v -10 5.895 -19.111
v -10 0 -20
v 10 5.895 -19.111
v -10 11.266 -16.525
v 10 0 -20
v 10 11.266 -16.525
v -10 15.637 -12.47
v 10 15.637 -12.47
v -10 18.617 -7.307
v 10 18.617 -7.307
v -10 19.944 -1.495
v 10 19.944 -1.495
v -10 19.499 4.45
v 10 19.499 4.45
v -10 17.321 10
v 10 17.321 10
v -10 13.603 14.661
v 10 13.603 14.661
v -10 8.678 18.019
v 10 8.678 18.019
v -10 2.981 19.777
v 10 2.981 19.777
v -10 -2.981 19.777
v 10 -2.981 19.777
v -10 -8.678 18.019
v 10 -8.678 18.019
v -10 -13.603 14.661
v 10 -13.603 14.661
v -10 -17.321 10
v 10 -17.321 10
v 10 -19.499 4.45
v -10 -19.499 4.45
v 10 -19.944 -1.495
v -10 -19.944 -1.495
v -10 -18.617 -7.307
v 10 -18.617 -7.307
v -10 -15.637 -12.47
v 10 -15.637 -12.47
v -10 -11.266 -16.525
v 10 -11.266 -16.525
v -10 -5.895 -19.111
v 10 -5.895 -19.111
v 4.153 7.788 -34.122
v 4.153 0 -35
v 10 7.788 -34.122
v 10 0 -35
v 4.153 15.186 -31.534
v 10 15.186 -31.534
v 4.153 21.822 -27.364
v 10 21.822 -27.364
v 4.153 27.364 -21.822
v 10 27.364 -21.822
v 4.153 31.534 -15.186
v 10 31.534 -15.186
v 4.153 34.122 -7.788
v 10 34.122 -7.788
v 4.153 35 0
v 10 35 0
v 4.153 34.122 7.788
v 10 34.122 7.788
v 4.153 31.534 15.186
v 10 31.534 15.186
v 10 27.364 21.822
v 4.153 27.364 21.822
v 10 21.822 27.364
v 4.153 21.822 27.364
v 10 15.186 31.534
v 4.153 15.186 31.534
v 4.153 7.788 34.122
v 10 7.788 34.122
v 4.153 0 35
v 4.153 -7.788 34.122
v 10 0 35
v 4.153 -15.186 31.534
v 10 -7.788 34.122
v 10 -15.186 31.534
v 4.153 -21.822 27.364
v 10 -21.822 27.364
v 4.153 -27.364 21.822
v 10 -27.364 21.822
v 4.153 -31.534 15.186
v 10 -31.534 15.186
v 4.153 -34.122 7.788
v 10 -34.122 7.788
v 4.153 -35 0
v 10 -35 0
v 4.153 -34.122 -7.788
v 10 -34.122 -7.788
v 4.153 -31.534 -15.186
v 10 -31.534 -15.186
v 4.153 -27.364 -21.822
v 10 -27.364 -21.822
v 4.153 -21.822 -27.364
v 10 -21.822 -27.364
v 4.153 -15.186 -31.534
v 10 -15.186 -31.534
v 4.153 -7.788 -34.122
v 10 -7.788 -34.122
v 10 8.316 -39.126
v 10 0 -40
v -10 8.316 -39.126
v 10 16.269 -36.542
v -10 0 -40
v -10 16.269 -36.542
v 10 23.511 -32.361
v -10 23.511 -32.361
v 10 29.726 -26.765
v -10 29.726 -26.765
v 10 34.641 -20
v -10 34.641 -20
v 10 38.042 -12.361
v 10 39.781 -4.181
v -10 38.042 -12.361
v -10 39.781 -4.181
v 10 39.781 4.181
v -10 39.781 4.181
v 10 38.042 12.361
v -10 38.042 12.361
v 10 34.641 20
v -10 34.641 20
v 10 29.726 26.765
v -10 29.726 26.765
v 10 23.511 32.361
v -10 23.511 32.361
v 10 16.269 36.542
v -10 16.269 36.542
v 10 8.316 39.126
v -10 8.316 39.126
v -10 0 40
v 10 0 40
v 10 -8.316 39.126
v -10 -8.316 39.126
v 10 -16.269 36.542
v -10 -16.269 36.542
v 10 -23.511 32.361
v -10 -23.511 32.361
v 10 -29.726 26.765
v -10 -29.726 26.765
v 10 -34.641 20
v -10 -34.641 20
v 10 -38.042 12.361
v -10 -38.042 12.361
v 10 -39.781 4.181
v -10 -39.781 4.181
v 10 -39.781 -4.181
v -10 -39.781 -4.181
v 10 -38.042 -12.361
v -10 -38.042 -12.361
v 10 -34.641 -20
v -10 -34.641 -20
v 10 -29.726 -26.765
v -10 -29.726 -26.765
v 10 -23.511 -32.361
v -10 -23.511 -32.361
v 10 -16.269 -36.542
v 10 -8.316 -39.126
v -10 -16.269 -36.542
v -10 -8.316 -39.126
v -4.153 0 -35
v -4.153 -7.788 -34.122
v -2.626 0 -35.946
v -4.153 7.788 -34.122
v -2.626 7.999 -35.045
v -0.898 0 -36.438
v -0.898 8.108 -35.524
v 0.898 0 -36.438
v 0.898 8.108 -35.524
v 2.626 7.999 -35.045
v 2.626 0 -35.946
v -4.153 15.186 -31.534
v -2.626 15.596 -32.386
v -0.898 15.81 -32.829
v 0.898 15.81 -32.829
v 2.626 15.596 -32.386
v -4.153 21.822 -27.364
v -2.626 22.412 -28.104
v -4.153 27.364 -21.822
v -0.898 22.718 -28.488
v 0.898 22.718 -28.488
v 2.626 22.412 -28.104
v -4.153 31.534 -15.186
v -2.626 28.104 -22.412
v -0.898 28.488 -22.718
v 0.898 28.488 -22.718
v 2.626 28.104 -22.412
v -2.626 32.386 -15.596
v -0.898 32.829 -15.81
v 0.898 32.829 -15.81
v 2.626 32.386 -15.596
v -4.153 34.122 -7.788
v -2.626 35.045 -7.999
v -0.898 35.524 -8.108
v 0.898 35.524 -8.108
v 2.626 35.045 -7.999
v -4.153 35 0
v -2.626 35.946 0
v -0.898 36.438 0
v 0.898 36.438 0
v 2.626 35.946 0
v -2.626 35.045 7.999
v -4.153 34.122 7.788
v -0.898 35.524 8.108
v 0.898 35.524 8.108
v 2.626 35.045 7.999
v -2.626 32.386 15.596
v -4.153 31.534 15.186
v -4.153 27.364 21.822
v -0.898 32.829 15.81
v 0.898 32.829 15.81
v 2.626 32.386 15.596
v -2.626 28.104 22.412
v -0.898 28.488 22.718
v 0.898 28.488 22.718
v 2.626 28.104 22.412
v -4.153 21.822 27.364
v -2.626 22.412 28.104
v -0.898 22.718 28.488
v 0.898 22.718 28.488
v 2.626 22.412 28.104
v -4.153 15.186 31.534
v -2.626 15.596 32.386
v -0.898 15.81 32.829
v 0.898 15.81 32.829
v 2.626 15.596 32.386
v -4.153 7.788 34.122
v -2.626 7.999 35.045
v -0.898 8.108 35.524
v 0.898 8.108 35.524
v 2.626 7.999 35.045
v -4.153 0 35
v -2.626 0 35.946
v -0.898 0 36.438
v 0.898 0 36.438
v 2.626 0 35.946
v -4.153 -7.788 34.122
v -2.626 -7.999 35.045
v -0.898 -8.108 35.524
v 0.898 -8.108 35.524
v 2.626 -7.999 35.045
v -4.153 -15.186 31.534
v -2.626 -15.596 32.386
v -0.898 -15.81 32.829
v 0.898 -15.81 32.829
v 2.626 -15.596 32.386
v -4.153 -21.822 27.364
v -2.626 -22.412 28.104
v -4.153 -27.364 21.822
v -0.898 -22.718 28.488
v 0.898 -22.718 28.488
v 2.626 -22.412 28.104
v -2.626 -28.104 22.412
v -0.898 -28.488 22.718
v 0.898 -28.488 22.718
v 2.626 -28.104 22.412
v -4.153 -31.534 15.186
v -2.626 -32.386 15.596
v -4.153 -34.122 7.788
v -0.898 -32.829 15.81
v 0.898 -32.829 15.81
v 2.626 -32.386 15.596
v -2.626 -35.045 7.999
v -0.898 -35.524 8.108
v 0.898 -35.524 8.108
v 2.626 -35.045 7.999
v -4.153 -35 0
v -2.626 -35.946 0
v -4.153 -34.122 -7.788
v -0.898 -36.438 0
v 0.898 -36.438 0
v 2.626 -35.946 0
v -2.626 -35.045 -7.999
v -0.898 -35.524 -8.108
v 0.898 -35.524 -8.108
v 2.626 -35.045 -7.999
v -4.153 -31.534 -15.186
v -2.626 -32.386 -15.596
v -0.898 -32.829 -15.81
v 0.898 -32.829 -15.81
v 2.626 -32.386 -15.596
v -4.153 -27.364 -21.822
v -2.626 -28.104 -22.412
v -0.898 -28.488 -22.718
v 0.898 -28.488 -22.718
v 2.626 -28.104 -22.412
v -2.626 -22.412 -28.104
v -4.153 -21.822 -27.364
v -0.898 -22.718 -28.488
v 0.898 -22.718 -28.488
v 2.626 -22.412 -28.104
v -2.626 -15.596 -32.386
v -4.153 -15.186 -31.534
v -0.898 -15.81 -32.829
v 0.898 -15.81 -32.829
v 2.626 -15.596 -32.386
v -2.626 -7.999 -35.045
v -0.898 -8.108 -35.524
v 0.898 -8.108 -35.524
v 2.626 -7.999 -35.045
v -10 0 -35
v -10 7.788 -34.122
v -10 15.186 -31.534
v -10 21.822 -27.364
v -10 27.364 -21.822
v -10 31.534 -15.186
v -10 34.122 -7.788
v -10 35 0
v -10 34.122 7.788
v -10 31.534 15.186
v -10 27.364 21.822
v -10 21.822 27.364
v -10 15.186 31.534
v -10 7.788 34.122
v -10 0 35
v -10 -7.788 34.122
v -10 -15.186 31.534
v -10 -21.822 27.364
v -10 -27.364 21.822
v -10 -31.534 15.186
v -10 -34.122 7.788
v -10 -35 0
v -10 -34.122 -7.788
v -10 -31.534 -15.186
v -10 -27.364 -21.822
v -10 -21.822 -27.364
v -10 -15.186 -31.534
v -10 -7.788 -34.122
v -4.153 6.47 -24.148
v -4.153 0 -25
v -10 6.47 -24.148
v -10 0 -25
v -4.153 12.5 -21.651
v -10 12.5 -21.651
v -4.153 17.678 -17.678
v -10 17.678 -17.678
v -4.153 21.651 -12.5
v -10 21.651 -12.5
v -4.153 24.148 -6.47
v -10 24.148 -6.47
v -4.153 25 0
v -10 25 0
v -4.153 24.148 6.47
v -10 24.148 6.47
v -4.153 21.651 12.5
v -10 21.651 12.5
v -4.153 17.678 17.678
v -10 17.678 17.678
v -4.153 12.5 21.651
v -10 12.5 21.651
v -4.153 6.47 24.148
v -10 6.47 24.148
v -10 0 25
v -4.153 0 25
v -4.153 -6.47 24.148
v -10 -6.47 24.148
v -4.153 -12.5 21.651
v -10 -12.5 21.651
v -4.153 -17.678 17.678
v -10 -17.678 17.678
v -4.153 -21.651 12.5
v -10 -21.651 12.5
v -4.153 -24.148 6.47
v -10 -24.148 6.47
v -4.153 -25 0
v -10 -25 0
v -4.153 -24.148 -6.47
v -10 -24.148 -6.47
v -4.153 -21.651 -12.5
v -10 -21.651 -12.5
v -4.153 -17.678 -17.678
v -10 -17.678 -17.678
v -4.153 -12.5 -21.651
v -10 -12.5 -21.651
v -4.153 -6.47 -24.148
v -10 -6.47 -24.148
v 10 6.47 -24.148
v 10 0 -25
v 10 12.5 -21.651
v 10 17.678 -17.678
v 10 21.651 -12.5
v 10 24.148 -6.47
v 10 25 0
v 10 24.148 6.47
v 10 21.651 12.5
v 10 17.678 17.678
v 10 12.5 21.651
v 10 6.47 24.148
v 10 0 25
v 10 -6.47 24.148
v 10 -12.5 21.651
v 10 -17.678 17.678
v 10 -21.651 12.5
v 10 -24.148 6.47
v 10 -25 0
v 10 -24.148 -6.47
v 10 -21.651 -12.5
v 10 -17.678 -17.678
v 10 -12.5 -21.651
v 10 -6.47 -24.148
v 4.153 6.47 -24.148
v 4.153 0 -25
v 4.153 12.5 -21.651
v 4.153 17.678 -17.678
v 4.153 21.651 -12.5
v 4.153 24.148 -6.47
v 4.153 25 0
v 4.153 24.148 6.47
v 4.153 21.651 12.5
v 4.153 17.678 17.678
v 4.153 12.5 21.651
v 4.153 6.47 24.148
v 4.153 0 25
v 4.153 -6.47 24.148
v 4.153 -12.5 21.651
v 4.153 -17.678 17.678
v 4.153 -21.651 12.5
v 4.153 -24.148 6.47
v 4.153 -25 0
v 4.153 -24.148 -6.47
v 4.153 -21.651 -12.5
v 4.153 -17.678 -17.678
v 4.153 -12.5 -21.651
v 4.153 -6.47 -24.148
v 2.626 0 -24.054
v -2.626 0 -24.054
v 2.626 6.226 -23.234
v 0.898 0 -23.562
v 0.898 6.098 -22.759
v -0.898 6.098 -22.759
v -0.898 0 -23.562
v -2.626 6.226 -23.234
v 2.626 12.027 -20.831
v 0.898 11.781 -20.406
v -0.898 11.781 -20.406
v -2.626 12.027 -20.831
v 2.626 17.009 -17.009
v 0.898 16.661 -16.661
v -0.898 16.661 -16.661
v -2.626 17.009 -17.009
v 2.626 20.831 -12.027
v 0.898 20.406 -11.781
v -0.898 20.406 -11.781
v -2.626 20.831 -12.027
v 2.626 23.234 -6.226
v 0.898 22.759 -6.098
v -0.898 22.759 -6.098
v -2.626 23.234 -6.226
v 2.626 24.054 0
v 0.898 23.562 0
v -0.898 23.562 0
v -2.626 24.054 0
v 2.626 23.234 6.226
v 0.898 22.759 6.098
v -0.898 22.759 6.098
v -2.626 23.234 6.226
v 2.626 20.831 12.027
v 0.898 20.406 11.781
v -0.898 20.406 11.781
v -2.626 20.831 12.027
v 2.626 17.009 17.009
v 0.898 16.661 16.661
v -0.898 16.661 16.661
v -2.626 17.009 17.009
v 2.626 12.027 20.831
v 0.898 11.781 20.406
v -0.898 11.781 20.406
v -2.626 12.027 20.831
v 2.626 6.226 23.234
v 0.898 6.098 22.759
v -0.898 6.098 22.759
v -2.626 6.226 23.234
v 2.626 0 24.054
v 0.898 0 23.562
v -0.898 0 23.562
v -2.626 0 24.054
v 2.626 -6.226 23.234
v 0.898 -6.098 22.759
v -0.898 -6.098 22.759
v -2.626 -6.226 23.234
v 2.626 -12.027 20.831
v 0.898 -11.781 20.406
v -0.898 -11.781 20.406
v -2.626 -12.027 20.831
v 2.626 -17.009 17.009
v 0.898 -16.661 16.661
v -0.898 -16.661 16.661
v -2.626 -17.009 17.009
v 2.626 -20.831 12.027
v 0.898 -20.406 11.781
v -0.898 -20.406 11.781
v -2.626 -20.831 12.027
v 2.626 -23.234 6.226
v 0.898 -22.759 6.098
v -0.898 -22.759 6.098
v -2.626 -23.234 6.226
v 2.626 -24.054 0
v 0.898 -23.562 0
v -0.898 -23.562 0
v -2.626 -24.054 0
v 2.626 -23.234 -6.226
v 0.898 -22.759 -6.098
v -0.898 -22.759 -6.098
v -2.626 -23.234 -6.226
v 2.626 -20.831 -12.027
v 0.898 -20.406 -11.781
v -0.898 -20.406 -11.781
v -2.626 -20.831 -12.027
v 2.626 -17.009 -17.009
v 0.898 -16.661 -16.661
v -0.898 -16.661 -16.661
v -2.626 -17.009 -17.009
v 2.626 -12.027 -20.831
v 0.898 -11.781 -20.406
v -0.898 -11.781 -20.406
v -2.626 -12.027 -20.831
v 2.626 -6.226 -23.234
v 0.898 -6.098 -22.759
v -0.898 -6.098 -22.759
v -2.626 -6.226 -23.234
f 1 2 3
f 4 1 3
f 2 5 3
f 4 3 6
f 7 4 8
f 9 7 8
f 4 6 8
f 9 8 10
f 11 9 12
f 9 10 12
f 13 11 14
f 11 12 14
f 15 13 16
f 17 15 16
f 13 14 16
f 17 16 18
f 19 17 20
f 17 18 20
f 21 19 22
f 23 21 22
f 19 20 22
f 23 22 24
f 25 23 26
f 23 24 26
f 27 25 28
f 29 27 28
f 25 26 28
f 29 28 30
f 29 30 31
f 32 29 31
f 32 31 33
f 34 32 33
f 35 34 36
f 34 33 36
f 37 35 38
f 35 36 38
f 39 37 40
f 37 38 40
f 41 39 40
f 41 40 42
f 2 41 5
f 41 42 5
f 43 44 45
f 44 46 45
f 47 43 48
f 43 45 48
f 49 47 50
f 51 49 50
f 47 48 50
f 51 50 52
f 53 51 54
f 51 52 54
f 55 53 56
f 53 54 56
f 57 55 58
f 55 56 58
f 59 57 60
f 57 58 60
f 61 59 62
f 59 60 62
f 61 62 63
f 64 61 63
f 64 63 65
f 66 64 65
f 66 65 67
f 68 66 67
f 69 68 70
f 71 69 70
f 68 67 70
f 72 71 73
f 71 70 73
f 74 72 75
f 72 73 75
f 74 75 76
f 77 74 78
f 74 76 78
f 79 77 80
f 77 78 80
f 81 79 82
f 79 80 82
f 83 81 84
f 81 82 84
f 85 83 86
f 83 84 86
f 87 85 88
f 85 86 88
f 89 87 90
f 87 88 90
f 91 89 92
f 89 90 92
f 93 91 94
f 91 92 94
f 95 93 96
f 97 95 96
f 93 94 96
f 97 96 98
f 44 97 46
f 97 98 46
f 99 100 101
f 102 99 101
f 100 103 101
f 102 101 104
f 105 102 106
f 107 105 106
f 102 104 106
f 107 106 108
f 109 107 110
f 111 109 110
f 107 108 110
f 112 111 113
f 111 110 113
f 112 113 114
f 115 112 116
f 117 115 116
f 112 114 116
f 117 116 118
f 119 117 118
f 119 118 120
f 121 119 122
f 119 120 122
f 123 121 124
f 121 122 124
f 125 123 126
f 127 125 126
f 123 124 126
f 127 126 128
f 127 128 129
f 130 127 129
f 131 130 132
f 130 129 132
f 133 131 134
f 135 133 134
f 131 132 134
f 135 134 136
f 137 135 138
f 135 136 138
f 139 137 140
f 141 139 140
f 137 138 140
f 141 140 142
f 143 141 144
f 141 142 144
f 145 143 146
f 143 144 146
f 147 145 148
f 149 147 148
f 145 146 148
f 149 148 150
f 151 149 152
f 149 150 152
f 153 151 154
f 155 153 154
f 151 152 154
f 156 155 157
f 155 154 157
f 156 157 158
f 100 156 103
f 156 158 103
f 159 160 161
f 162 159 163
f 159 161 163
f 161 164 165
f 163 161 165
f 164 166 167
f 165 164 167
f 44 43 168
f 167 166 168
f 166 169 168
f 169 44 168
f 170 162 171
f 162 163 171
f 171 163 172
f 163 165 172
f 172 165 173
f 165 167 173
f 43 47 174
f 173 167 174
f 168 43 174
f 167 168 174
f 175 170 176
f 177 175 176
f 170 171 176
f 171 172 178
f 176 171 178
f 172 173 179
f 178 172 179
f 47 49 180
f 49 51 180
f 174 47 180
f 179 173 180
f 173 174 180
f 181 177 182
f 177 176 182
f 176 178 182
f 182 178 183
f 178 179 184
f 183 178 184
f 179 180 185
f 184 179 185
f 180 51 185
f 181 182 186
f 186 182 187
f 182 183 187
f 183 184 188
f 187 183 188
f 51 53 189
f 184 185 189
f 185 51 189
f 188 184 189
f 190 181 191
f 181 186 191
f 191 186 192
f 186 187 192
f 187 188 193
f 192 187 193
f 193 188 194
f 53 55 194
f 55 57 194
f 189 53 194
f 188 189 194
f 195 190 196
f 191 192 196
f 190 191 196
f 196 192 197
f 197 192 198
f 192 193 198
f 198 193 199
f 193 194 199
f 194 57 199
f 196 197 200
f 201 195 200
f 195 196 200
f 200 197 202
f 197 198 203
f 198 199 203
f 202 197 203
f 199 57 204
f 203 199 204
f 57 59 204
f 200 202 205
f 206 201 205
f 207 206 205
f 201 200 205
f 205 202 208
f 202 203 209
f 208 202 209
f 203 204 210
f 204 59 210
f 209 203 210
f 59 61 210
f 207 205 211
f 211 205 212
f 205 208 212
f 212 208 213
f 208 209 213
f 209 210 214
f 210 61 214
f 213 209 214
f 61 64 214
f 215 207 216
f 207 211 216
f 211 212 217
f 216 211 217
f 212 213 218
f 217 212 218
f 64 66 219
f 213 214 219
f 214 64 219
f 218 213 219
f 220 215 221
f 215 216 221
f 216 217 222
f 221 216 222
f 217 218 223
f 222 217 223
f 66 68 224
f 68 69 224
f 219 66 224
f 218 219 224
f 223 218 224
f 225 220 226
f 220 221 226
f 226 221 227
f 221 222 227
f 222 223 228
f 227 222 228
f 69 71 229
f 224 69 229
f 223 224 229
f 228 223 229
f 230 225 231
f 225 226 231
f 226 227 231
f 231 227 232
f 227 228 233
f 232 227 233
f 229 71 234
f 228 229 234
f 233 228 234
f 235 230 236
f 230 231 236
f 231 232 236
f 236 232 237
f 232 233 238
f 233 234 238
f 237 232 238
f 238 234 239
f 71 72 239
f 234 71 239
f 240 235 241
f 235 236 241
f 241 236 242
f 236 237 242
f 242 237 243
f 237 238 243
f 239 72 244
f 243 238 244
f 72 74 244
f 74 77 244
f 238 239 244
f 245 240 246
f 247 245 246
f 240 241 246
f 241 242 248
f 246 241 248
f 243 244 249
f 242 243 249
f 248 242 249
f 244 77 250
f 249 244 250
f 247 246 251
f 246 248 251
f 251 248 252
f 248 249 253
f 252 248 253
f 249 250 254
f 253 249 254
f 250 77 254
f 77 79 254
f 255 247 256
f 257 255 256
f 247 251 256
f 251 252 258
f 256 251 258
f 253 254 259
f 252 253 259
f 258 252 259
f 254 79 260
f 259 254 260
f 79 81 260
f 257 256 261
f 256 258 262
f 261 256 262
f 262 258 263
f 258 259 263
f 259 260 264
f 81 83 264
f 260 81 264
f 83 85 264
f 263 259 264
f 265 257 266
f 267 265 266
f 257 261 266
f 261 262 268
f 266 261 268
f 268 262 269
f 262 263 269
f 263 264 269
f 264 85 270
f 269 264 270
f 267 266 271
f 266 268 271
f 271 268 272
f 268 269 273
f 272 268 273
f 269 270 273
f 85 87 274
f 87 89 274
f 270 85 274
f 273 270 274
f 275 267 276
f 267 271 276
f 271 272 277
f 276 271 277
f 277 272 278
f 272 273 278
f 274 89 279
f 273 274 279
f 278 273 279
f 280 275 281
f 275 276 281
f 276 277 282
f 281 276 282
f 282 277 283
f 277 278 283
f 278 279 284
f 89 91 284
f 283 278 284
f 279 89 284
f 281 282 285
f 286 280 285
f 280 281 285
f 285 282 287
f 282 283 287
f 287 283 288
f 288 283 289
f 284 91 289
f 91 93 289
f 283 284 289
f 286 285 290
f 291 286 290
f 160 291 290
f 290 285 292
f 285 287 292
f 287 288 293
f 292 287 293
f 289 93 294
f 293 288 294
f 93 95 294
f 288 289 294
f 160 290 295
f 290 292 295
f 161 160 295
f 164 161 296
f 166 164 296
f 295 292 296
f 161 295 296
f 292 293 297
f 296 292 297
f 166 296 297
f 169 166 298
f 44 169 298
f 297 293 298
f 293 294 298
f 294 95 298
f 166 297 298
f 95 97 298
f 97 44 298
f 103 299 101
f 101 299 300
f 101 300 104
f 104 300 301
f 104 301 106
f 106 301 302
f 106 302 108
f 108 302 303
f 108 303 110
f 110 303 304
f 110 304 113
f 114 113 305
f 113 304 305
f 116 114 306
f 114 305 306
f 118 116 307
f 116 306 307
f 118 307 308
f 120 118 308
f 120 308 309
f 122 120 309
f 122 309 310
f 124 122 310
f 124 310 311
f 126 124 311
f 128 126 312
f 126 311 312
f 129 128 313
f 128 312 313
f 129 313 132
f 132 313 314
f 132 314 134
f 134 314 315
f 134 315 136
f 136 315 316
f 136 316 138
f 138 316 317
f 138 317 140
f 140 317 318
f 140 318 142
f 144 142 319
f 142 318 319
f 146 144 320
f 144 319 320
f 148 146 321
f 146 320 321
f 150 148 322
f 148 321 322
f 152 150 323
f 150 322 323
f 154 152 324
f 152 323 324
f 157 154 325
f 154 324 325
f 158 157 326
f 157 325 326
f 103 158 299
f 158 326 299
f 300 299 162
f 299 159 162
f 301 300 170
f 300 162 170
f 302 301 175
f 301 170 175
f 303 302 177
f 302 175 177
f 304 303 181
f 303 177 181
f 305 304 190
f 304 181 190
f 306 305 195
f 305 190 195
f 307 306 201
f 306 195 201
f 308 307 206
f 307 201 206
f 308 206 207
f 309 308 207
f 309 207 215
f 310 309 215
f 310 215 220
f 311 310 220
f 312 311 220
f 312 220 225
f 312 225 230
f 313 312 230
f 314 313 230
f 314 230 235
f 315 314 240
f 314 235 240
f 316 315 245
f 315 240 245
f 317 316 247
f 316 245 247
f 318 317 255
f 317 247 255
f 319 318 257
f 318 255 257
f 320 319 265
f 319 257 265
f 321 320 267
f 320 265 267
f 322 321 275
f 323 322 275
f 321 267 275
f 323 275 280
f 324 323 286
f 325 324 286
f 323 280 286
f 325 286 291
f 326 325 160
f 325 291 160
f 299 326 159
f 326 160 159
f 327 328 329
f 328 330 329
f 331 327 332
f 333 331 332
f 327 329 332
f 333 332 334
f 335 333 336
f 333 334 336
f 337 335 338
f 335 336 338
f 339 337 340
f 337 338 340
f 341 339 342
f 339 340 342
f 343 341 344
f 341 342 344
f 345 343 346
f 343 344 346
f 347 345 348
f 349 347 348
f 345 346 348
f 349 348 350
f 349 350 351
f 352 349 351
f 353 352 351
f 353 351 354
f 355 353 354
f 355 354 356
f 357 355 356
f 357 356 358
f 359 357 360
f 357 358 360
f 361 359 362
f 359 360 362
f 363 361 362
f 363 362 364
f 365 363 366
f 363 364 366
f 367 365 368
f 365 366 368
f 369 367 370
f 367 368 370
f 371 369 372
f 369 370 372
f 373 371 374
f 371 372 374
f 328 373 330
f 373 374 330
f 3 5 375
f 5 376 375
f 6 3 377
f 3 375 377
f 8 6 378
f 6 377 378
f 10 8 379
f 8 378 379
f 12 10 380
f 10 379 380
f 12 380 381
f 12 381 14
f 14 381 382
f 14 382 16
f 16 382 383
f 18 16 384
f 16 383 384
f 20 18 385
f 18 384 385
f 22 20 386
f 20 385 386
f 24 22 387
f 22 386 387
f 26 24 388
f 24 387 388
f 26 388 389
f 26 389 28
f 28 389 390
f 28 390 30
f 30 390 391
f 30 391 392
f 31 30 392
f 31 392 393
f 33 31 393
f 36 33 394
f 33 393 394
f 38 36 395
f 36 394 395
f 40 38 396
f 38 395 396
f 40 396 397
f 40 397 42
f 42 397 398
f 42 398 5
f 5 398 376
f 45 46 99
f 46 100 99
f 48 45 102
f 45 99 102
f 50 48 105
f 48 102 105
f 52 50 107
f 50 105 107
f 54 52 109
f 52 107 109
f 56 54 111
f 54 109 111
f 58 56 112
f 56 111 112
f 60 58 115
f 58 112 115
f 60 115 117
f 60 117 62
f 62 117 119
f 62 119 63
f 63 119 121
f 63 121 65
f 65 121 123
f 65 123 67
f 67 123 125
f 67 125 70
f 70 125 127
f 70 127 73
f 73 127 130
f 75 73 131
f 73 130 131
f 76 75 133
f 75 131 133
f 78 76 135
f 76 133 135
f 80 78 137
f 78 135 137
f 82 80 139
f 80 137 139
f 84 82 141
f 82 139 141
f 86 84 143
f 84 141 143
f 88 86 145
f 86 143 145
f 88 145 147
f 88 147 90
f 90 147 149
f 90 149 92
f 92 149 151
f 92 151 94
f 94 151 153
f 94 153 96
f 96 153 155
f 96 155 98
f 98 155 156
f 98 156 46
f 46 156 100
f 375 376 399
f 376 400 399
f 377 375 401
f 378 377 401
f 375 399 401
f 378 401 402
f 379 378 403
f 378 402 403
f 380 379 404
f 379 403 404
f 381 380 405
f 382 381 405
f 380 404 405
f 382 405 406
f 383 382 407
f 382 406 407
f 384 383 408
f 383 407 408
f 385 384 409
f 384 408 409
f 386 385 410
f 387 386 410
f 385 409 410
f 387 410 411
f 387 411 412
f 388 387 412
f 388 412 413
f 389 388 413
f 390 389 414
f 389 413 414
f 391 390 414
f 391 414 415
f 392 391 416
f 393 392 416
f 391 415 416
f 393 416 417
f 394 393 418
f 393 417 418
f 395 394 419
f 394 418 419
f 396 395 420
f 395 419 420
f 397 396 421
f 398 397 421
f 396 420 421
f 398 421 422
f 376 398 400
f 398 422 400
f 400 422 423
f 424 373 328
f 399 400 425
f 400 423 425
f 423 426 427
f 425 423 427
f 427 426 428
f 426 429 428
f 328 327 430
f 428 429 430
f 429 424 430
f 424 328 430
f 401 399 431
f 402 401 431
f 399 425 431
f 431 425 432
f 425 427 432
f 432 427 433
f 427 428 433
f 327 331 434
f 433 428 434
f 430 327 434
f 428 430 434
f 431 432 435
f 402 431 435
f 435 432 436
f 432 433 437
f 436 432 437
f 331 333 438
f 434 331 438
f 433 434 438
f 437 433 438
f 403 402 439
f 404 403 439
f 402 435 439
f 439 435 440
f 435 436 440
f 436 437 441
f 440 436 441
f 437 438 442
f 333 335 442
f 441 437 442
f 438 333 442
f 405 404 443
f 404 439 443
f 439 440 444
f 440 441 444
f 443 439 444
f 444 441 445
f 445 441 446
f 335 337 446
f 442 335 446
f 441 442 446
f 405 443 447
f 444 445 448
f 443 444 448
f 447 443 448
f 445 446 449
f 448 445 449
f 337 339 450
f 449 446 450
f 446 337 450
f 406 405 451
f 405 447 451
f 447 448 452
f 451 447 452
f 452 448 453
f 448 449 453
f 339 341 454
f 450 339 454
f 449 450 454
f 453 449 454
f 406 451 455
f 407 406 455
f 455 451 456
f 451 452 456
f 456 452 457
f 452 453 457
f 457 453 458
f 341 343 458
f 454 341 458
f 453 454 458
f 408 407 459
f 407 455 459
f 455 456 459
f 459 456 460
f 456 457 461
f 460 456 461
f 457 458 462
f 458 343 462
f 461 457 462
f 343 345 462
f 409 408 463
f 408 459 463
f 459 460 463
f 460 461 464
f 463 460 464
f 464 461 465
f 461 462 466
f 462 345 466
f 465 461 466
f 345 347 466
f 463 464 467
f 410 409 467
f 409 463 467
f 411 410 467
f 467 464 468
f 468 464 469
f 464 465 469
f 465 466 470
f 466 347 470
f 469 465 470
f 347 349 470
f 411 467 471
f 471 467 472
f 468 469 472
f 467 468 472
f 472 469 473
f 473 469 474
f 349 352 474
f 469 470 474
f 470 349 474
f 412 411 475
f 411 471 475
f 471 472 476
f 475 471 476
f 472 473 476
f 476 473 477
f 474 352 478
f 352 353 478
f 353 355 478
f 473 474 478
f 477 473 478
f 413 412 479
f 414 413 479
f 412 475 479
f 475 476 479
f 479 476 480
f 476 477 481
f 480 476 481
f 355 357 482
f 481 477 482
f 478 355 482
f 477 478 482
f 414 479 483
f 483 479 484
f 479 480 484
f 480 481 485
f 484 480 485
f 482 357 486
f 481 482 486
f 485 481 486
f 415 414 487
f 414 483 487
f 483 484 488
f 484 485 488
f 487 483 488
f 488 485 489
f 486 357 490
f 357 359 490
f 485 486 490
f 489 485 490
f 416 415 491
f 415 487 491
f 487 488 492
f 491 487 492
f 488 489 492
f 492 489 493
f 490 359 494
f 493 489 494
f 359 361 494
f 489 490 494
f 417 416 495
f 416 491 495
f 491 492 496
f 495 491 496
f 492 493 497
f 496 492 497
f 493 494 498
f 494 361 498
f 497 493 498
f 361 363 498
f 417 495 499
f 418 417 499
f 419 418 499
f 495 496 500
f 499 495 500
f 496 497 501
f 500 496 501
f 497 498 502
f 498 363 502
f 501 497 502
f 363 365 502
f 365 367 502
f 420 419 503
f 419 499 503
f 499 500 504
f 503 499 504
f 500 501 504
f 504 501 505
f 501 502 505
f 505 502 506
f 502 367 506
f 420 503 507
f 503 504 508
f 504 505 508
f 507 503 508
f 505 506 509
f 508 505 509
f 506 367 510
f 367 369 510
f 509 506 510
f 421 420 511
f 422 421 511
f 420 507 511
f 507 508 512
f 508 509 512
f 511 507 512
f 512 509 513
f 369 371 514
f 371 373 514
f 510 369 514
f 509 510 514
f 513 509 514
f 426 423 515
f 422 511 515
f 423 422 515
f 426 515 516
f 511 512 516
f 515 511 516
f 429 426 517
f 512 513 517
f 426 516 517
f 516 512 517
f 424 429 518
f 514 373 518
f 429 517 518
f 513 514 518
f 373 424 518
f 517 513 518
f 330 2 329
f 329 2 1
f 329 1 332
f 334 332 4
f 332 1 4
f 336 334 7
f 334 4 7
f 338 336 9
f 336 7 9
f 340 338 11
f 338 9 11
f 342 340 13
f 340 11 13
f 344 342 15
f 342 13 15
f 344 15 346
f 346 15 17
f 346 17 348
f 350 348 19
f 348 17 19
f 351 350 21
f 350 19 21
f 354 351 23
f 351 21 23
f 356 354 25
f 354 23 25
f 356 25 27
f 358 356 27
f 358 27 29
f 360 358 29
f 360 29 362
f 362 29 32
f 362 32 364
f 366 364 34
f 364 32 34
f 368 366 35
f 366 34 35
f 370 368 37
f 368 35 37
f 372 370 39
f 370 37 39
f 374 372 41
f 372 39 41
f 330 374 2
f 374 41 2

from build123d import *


with BuildPart() as part:
    # Sweep1: sweep along a path in Sketch5
    with BuildLine(Plane(origin=(0, 0, 0), x_dir=(0, 0, -1), z_dir=(1, 0, 0))) as sweep1_path:
        CenterArc((0, 0), 30, 0, 360)
    # Sketch1 → Sweep1 (sweep)
    with BuildSketch(Plane.XY):
        with BuildLine():
            Line((-10, 35), (-4.153311931, 35))
            ThreePointArc((-4.153311931, 35), (0, 36.5), (4.153311931, 35))
            Line((4.153311931, 35), (10, 35))
            Line((10, 35), (10, 40))
            Line((10, 40), (-10, 40))
            Line((-10, 40), (-10, 35))
        make_face()
        with BuildLine():
            Line((-10, 20), (10, 20))
            Line((10, 20), (10, 25))
            Line((10, 25), (4.153311931, 25))
            ThreePointArc((4.153311931, 25), (0, 23.5), (-4.153311931, 25))
            Line((-4.153311931, 25), (-10, 25))
            Line((-10, 25), (-10, 20))
        make_face()
    sweep(path=sweep1_path.line)


solid = part.part
